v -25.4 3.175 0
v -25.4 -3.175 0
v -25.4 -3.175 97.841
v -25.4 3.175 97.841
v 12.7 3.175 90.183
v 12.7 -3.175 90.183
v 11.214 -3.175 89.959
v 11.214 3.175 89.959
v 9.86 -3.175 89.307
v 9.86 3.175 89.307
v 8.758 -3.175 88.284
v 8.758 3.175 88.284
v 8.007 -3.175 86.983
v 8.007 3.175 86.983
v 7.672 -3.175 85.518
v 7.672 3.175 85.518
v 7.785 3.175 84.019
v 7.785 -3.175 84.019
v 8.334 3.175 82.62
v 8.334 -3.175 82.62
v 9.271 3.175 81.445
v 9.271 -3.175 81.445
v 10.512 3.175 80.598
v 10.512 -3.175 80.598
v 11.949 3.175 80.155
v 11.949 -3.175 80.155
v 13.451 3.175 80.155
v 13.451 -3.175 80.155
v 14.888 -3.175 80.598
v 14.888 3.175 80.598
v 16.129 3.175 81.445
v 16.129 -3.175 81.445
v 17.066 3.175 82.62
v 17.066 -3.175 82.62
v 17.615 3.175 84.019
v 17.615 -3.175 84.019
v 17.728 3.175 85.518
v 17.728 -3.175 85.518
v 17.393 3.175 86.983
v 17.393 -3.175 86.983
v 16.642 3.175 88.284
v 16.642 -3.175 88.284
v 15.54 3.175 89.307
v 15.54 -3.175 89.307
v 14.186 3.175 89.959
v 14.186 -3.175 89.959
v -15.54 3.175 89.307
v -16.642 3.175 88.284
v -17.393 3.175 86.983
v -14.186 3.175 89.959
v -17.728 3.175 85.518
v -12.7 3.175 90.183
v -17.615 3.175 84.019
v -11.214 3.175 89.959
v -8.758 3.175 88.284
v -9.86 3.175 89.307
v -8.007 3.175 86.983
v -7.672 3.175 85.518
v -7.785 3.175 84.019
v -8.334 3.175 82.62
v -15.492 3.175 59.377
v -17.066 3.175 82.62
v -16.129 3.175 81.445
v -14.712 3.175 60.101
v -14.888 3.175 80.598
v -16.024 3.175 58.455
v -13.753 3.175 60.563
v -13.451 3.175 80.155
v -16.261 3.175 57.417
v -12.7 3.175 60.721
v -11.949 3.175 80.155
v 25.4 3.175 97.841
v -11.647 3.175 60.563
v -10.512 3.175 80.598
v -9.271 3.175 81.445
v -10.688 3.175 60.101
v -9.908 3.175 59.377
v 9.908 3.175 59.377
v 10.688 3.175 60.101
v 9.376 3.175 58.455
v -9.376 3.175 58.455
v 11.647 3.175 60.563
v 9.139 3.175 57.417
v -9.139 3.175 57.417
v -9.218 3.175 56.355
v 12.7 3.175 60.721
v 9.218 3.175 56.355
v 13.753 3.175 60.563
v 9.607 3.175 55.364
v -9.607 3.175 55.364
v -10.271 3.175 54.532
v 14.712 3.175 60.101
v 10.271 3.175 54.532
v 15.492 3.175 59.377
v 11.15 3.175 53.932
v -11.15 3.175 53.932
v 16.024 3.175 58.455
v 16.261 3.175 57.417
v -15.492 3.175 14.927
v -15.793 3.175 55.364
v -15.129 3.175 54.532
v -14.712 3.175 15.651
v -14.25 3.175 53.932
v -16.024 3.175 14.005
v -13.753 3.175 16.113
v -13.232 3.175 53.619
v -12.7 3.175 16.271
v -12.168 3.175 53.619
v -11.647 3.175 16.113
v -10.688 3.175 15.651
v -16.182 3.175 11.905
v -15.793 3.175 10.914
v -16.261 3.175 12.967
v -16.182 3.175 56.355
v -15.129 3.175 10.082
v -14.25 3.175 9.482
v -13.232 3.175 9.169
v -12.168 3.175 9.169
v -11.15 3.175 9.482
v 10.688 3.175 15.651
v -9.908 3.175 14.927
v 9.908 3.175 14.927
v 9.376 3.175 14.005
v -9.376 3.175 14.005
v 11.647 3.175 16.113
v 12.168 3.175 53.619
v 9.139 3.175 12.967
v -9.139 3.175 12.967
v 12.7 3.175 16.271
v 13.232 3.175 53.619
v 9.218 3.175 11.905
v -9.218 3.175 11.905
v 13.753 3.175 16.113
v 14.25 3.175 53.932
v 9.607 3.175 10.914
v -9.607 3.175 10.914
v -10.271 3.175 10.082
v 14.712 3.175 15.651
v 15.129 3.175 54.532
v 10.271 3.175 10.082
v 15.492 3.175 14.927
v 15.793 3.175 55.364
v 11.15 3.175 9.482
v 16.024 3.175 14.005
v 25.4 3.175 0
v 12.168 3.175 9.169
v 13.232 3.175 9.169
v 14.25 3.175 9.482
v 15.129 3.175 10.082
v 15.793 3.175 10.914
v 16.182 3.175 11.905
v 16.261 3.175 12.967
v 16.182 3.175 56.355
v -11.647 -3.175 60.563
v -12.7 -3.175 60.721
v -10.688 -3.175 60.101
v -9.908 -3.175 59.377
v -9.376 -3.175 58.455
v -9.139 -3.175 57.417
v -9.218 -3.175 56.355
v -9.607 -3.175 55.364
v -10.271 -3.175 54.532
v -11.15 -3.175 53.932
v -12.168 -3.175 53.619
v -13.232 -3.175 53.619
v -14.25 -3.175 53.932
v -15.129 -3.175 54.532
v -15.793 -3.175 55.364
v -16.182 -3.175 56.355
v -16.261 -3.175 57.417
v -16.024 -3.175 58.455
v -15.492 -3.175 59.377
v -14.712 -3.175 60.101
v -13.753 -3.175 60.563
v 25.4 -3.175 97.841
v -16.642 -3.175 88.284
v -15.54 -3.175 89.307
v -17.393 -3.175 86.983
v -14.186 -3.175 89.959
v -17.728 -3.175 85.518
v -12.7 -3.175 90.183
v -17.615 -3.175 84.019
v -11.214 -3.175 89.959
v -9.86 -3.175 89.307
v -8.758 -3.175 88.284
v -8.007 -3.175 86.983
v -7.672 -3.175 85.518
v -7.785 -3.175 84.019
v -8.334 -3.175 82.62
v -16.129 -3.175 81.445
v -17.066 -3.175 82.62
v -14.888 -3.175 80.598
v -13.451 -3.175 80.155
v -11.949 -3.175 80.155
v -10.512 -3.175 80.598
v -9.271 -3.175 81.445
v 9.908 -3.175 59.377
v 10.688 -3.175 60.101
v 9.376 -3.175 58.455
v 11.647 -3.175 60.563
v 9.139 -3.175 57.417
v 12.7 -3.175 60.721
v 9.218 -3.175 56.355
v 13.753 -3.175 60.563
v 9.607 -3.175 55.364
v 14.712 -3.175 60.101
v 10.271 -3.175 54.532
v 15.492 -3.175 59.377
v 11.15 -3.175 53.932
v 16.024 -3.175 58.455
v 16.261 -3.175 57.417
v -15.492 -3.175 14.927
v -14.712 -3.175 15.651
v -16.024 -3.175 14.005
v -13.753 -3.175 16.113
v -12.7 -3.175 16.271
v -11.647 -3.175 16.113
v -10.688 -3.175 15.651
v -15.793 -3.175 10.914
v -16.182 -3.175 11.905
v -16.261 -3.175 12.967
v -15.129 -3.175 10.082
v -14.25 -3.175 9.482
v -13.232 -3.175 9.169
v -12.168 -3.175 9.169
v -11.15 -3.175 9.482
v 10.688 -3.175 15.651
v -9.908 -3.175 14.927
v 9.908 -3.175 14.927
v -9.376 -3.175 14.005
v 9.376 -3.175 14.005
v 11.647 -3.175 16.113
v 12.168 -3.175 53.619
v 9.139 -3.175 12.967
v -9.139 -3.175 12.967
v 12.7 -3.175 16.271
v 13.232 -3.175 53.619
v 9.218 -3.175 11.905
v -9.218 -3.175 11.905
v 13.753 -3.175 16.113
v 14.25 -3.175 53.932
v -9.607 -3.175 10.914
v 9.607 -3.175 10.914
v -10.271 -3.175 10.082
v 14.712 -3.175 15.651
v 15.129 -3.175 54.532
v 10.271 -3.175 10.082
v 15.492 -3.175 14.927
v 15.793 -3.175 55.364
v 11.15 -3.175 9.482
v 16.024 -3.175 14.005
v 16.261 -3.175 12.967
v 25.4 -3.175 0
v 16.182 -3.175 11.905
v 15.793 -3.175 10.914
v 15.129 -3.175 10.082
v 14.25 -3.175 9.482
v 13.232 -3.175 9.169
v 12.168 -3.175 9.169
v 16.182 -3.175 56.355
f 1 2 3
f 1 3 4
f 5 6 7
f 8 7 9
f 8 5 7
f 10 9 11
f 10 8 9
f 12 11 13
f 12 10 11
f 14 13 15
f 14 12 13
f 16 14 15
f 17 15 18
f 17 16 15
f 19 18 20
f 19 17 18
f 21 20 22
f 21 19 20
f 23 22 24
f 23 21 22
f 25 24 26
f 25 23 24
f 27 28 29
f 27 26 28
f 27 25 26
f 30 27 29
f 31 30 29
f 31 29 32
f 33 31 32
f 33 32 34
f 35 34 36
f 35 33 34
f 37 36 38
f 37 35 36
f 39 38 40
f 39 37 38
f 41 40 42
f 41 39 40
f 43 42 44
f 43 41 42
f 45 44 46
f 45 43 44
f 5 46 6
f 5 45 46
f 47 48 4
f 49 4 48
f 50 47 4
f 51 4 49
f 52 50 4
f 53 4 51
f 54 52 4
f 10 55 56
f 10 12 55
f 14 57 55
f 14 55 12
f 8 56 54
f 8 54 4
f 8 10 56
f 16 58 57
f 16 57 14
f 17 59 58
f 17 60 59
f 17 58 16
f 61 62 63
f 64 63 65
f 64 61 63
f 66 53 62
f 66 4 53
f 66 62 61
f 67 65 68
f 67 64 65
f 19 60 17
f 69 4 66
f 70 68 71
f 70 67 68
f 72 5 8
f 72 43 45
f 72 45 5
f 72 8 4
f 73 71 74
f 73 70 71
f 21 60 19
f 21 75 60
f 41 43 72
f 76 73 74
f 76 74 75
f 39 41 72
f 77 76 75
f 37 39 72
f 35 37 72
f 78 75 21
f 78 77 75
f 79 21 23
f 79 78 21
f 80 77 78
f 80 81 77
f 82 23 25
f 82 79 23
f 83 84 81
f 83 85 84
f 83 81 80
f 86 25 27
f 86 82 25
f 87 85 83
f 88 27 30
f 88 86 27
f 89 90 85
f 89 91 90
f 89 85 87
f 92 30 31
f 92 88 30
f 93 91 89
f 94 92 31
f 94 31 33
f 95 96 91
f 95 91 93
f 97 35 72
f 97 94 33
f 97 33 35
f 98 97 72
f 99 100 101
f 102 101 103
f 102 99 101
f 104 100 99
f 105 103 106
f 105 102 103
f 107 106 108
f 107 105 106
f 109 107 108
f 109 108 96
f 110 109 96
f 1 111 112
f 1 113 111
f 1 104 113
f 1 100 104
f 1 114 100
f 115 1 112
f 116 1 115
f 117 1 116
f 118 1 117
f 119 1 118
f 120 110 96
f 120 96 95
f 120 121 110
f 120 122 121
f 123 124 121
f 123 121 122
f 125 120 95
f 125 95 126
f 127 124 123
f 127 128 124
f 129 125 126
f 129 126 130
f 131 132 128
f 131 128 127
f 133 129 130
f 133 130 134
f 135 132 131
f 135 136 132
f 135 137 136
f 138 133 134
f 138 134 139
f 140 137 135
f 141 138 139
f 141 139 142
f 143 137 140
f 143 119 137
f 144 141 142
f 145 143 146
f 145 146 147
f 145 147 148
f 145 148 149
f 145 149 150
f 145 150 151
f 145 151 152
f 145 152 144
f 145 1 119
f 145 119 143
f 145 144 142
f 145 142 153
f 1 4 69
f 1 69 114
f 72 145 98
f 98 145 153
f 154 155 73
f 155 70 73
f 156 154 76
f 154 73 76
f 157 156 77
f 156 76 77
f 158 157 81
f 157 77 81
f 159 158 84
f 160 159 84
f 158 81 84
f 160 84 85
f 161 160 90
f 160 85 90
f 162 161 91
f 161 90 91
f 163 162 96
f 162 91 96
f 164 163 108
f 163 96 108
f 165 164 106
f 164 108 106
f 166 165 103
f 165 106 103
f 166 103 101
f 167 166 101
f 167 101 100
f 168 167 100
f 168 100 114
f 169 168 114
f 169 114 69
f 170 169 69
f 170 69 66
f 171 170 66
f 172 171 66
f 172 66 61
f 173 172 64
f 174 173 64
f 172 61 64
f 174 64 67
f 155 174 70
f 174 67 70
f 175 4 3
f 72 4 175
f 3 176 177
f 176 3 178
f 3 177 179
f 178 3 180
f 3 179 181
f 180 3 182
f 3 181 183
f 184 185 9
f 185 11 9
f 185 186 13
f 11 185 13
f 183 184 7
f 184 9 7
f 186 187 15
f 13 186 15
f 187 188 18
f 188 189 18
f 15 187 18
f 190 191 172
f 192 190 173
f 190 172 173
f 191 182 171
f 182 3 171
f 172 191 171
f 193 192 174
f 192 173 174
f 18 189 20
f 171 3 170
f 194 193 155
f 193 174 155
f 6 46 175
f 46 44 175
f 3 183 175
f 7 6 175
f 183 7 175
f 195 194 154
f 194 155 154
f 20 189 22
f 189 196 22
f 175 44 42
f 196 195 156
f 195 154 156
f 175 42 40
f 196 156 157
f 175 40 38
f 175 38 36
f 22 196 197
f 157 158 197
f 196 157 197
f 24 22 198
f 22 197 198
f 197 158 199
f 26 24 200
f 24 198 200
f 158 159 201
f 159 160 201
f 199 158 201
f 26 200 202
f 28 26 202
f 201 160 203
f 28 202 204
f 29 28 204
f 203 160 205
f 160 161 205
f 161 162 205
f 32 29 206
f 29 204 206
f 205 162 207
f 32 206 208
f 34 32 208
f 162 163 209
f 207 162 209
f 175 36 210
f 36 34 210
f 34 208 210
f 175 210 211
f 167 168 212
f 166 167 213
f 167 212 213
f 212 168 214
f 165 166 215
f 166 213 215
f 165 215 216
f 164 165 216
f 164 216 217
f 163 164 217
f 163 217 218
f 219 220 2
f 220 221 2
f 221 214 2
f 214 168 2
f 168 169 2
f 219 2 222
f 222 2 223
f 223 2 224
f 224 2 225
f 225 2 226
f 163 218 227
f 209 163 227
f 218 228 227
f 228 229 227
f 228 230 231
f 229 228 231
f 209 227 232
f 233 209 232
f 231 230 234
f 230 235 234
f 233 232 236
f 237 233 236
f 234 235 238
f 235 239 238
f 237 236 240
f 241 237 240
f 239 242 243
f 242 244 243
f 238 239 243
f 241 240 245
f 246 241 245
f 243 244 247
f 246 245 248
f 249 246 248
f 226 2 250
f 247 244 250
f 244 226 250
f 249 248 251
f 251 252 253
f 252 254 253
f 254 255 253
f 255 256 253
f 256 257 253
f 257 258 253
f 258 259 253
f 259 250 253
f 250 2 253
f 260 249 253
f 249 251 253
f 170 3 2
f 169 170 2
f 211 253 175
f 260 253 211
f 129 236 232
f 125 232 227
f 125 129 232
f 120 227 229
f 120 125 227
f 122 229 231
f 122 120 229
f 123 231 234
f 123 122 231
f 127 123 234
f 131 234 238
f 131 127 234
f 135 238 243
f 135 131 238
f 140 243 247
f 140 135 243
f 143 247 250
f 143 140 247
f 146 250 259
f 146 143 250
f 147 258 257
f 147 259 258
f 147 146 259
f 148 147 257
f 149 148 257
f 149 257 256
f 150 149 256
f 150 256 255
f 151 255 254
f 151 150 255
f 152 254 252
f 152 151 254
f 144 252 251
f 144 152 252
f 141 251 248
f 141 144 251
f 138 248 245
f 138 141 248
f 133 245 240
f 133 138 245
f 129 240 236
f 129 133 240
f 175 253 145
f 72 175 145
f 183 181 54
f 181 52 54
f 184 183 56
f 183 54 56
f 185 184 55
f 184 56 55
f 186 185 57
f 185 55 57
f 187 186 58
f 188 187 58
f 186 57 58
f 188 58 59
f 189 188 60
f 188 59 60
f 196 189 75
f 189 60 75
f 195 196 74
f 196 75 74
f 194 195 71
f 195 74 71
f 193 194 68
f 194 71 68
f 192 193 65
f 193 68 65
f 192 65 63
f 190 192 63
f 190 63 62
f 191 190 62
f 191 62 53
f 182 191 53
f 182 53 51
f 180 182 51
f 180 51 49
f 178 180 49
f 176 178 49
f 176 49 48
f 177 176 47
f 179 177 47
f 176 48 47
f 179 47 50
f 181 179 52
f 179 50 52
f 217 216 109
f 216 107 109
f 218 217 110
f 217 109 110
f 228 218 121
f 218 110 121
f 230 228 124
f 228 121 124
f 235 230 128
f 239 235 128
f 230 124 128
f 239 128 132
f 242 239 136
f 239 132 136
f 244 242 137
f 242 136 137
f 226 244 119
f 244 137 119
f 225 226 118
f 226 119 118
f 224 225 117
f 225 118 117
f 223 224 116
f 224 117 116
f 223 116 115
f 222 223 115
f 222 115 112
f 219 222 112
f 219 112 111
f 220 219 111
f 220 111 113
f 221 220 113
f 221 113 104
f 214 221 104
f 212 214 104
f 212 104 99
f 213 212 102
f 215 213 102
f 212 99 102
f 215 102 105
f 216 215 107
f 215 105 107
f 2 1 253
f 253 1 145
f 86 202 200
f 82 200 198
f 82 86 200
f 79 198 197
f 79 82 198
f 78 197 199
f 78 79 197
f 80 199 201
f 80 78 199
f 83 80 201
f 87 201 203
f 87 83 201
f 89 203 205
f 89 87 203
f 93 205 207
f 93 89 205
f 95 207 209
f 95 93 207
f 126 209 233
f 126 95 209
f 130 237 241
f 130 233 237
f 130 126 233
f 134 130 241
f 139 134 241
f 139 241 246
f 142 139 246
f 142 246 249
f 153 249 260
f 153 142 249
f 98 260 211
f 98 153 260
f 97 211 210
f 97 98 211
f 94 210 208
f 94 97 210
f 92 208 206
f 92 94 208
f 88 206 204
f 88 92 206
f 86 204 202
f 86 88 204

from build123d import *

# Parameters (mm, degrees)
SKETCH1_W                        = 50.8
SKETCH1_H                        = 6.35
EXTRUDE1_DEPTH                   = 97.8408
F_1_4_CLEARANCE_HOLE1_AT_2_COUNT = 2
F_1_4_CLEARANCE_HOLE1_AT_2_PITCH = 44.45


with BuildPart() as part:
    # Sketch1 → Extrude1 (new body)
    with BuildSketch(Plane.XY):
        Rectangle(SKETCH1_W, SKETCH1_H)
    extrude(amount=EXTRUDE1_DEPTH)

    # Sketch4 → 3/8 Clearance Hole1 (revolve, cut)
    with BuildSketch(Plane(origin=(12.7, 3.175, 85.1408), x_dir=(0, 0, 1), z_dir=(1, 0, 0))):
        Polygon((0, 0), (0, 19.031479155), (5.0419, 16.002), (5.0419, 0), align=None)
    f_3_8_clearance_hole1 = revolve(axis=Axis((12.7, 9.525, 85.1408), (0, -1, 0)), mode=Mode.SUBTRACT)

    # Sketch5 → 1/4 Clearance Hole1 (revolve, cut)
    with BuildSketch(Plane(origin=(12.7, 3.175, 57.15), x_dir=(0, 0, 1), z_dir=(1, 0, 0))):
        Polygon((0, 0), (0, 18.147817477), (3.57124, 16.002), (3.57124, 0), align=None)
    f_1_4_clearance_hole1 = revolve(axis=Axis((12.7, 9.525, 57.15), (0, -1, 0)), mode=Mode.SUBTRACT)

    # 1/4 Clearance Hole1 at 2: 1/4 Clearance Hole1 ×2
    with Locations(*[(0, 0, -i * F_1_4_CLEARANCE_HOLE1_AT_2_PITCH) for i in range(1, F_1_4_CLEARANCE_HOLE1_AT_2_COUNT)]):
        add(f_1_4_clearance_hole1, mode=Mode.SUBTRACT)

    # Mirror1: 3/8 Clearance Hole1, 1/4 Clearance Hole1 across plane
    add(f_3_8_clearance_hole1.mirror(Plane(origin=(0, 0, 0), x_dir=(0, 0, 1), z_dir=(1, 0, 0))), mode=Mode.SUBTRACT)
    add(f_1_4_clearance_hole1.mirror(Plane(origin=(0, 0, 0), x_dir=(0, 0, 1), z_dir=(1, 0, 0))), mode=Mode.SUBTRACT)

    # Mirror1 copy 1 sketch → Mirror1 copy 1 (revolve, cut)
    with BuildSketch(Plane(origin=(-12.7, 3.175, 12.7), x_dir=(0, 0, 1), z_dir=(-1, 0, 0))):
        Polygon((0, 0), (0, -18.147817477), (3.57124, -16.002), (3.57124, 0), align=None)
    revolve(axis=Axis((-12.7, 9.525, 12.7), (0, 1, 0)), mode=Mode.SUBTRACT)


solid = part.part
